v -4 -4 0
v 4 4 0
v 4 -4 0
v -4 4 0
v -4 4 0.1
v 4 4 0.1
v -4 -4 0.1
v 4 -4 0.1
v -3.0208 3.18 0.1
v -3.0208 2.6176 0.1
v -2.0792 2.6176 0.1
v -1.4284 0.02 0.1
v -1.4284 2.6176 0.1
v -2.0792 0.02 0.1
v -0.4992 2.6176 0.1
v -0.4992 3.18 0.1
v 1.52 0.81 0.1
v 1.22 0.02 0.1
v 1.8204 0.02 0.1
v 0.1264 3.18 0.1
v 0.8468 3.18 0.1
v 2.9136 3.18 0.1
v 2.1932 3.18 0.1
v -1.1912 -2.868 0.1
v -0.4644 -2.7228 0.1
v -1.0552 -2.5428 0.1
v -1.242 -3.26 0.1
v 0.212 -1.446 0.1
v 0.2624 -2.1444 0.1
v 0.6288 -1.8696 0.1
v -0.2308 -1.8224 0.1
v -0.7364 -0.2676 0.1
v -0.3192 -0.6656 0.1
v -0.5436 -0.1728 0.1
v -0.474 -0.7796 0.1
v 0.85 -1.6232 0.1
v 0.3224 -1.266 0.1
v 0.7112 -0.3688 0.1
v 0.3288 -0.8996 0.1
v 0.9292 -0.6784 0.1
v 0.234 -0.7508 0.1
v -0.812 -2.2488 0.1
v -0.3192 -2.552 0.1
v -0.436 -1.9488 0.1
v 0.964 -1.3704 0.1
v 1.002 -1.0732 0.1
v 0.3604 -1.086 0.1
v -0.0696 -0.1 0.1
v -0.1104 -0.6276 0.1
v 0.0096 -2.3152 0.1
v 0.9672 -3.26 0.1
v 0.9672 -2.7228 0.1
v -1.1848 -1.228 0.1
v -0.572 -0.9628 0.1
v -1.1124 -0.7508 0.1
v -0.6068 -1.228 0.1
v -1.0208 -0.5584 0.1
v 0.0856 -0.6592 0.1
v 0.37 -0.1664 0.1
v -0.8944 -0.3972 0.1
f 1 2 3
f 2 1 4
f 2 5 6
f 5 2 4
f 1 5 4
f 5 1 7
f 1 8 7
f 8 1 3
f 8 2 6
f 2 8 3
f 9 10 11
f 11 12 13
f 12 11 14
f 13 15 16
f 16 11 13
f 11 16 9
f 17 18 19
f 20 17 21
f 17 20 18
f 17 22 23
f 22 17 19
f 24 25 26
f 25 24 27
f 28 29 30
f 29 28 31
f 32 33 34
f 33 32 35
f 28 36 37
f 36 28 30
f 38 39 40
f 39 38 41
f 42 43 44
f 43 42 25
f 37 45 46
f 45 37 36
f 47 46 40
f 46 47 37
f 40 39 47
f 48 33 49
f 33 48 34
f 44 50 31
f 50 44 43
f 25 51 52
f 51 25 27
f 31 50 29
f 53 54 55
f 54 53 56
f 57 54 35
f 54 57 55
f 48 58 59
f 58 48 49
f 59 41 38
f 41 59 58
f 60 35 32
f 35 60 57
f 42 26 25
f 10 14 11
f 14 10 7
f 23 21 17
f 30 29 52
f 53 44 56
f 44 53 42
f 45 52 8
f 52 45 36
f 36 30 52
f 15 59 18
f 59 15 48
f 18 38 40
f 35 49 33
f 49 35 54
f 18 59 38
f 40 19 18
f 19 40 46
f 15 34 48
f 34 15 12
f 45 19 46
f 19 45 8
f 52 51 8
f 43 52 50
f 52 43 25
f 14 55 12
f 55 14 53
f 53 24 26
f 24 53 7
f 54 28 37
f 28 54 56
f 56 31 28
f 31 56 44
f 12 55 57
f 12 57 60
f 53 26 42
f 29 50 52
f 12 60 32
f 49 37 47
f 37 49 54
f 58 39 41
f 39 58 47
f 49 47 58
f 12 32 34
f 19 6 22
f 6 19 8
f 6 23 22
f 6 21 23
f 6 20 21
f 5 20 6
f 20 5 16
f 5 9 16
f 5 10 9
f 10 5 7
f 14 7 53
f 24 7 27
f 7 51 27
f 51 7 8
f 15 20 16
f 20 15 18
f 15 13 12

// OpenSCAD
// file: ../p/4-4edge.scad
use <../lib.scad>
$fa=1; $fs=0.2;
function ldraw_lib__4_4edge(realsolid=false) = [
// 0 Circle 1.0
// 0 Name: 4-4edge.dat
// 0 Author: James Jessiman
// 0 !LDRAW_ORG Primitive UPDATE 2017-01
// 0 !LICENSE Licensed under CC BY 2.0 and CC BY 4.0 : see CAreadme.txt
// 
// 0 BFC CERTIFY CCW
  [0,"BFC","CERTIFY"],
  [0,"BFC","CCW"],
// 
// 0 !HISTORY 1998-12-15 [PTadmin] Official Update 1998-10
// 0 !HISTORY 2005-12-28 [PTadmin] Official Update 2005-01
// 0 !HISTORY 2007-06-24 [PTadmin] Header formatted for Contributor Agreement
// 0 !HISTORY 2008-07-01 [PTadmin] Official Update 2008-01
// 0 !HISTORY 2017-01-15 [Steffen] BFCed
// 0 !HISTORY 2017-12-30 [PTadmin] Official Update 2017-01
// 
// 
// 2 24 1 0 0 0.9239 0 0.3827
  [2,24,1,0,0,0.9239,0,0.3827],
// 2 24 0.9239 0 0.3827 0.7071 0 0.7071
  [2,24,0.9239,0,0.3827,0.7071,0,0.7071],
// 2 24 0.7071 0 0.7071 0.3827 0 0.9239
  [2,24,0.7071,0,0.7071,0.3827,0,0.9239],
// 2 24 0.3827 0 0.9239 0 0 1
  [2,24,0.3827,0,0.9239,0,0,1],
// 2 24 0 0 1 -0.3827 0 0.9239
  [2,24,0,0,1,-0.3827,0,0.9239],
// 2 24 -0.3827 0 0.9239 -0.7071 0 0.7071
  [2,24,-0.3827,0,0.9239,-0.7071,0,0.7071],
// 2 24 -0.7071 0 0.7071 -0.9239 0 0.3827
  [2,24,-0.7071,0,0.7071,-0.9239,0,0.3827],
// 2 24 -0.9239 0 0.3827 -1 0 -0
  [2,24,-0.9239,0,0.3827,-1,0,-0],
// 2 24 -1 0 -0 -0.9239 0 -0.3827
  [2,24,-1,0,-0,-0.9239,0,-0.3827],
// 2 24 -0.9239 0 -0.3827 -0.7071 0 -0.7071
  [2,24,-0.9239,0,-0.3827,-0.7071,0,-0.7071],
// 2 24 -0.7071 0 -0.7071 -0.3827 0 -0.9239
  [2,24,-0.7071,0,-0.7071,-0.3827,0,-0.9239],
// 2 24 -0.3827 0 -0.9239 0 0 -1
  [2,24,-0.3827,0,-0.9239,0,0,-1],
// 2 24 0 0 -1 0.3827 0 -0.9239
  [2,24,0,0,-1,0.3827,0,-0.9239],
// 2 24 0.3827 0 -0.9239 0.7071 0 -0.7071
  [2,24,0.3827,0,-0.9239,0.7071,0,-0.7071],
// 2 24 0.7071 0 -0.7071 0.9239 0 -0.3827
  [2,24,0.7071,0,-0.7071,0.9239,0,-0.3827],
// 2 24 0.9239 0 -0.3827 1 0 0
  [2,24,0.9239,0,-0.3827,1,0,0],
];
module ldraw_lib__4_4edge(step=0, col=false, unit=2/5, alt=false, line=0.2, solid=!$preview)
    makepoly(ldraw_lib__4_4edge(solid), step=step, col=col, unit=unit, alt=alt, line=line, solid=solid);
ldraw_lib__4_4edge(line=0.2);
// file: ../p/4-4disc.scad
use <../lib.scad>
$fa=1; $fs=0.2;
function ldraw_lib__4_4disc(realsolid=false) = [
// 0 Disc 1.0
// 0 Name: 4-4disc.dat
// 0 Author: James Jessiman
// 0 !LDRAW_ORG Primitive UPDATE 2002-02
// 0 !LICENSE Licensed under CC BY 2.0 and CC BY 4.0 : see CAreadme.txt
// 
// 0 BFC CERTIFY CCW
  [0,"BFC","CERTIFY"],
  [0,"BFC","CCW"],
// 
// 0 !HISTORY 1998-12-15 [PTadmin] Official Update 1998-10
// 0 !HISTORY 2002-03-23 [sbliss] Added BFC statement
// 0 !HISTORY 2002-04-25 [PTadmin] Official Update 2002-02
// 0 !HISTORY 2007-06-24 [PTadmin] Header formatted for Contributor Agreement
// 0 !HISTORY 2008-07-01 [PTadmin] Official Update 2008-01
// 
// 
// 3 16 0 0 0 1 0 0 0.9239 0 0.3827
  [3,16,0,0,0,1,0,0,0.9239,0,0.3827],
// 3 16 0 0 0 0.9239 0 0.3827 0.7071 0 0.7071
  [3,16,0,0,0,0.9239,0,0.3827,0.7071,0,0.7071],
// 3 16 0 0 0 0.7071 0 0.7071 0.3827 0 0.9239
  [3,16,0,0,0,0.7071,0,0.7071,0.3827,0,0.9239],
// 3 16 0 0 0 0.3827 0 0.9239 0 0 1
  [3,16,0,0,0,0.3827,0,0.9239,0,0,1],
// 3 16 0 0 0 0 0 1 -0.3827 0 0.9239
  [3,16,0,0,0,0,0,1,-0.3827,0,0.9239],
// 3 16 0 0 0 -0.3827 0 0.9239 -0.7071 0 0.7071
  [3,16,0,0,0,-0.3827,0,0.9239,-0.7071,0,0.7071],
// 3 16 0 0 0 -0.7071 0 0.7071 -0.9239 0 0.3827
  [3,16,0,0,0,-0.7071,0,0.7071,-0.9239,0,0.3827],
// 3 16 0 0 0 -0.9239 0 0.3827 -1 0 -0
  [3,16,0,0,0,-0.9239,0,0.3827,-1,0,-0],
// 3 16 0 0 0 -1 0 -0 -0.9239 0 -0.3827
  [3,16,0,0,0,-1,0,-0,-0.9239,0,-0.3827],
// 3 16 0 0 0 -0.9239 0 -0.3827 -0.7071 0 -0.7071
  [3,16,0,0,0,-0.9239,0,-0.3827,-0.7071,0,-0.7071],
// 3 16 0 0 0 -0.7071 0 -0.7071 -0.3827 0 -0.9239
  [3,16,0,0,0,-0.7071,0,-0.7071,-0.3827,0,-0.9239],
// 3 16 0 0 0 -0.3827 0 -0.9239 0 0 -1
  [3,16,0,0,0,-0.3827,0,-0.9239,0,0,-1],
// 3 16 0 0 0 0 0 -1 0.3827 0 -0.9239
  [3,16,0,0,0,0,0,-1,0.3827,0,-0.9239],
// 3 16 0 0 0 0.3827 0 -0.9239 0.7071 0 -0.7071
  [3,16,0,0,0,0.3827,0,-0.9239,0.7071,0,-0.7071],
// 3 16 0 0 0 0.7071 0 -0.7071 0.9239 0 -0.3827
  [3,16,0,0,0,0.7071,0,-0.7071,0.9239,0,-0.3827],
// 3 16 0 0 0 0.9239 0 -0.3827 1 0 0
  [3,16,0,0,0,0.9239,0,-0.3827,1,0,0],
// 0
];
module ldraw_lib__4_4disc(step=0, col=false, unit=2/5, alt=false, line=0.2, solid=!$preview)
    makepoly(ldraw_lib__4_4disc(solid), step=step, col=col, unit=unit, alt=alt, line=line, solid=solid);
ldraw_lib__4_4disc(line=0.2);
// file: ../p/4-4cyli.scad
use <../lib.scad>
$fa=1; $fs=0.2;
function ldraw_lib__4_4cyli(realsolid=false) = [
// 0 Cylinder 1.0
// 0 Name: 4-4cyli.dat
// 0 Author: James Jessiman
// 0 !LDRAW_ORG Primitive UPDATE 2005-01
// 0 !LICENSE Licensed under CC BY 2.0 and CC BY 4.0 : see CAreadme.txt
// 
// 0 BFC CERTIFY CCW
  [0,"BFC","CERTIFY"],
  [0,"BFC","CCW"],
// 
// 0 !HISTORY 1998-12-15 [PTadmin] Official Update 1998-10
// 0 !HISTORY 2002-03-23 [sbliss] Added BFC statement; merged headers from files in distributions LDraw 0.27 and Complete.
// 0 !HISTORY 2002-04-25 [PTadmin] Official Update 2002-02
// 0 !HISTORY 2004-12-14 [guyvivan] BFC CCW
// 0 !HISTORY 2005-12-28 [PTadmin] Official Update 2005-01
// 0 !HISTORY 2007-06-24 [PTadmin] Header formatted for Contributor Agreement
// 0 !HISTORY 2008-07-01 [PTadmin] Official Update 2008-01
// 
// 
// 4 16 1 1 0 0.9239 1 0.3827 0.9239 0 0.3827 1 0 0
  [4,16,1,1,0,0.9239,1,0.3827,0.9239,0,0.3827,1,0,0],
// 5 24 1 0 0 1 1 0 0.9239 0 0.3827 0.9239 0 -0.3827
  [5,24,1,0,0,1,1,0,0.9239,0,0.3827,0.9239,0,-0.3827],
// 4 16 0.9239 1 0.3827 0.7071 1 0.7071 0.7071 0 0.7071 0.9239 0 0.3827
  [4,16,0.9239,1,0.3827,0.7071,1,0.7071,0.7071,0,0.7071,0.9239,0,0.3827],
// 5 24 0.9239 0 0.3827 0.9239 1 0.3827 0.7071 0 0.7071 1 0 0
  [5,24,0.9239,0,0.3827,0.9239,1,0.3827,0.7071,0,0.7071,1,0,0],
// 4 16 0.7071 1 0.7071 0.3827 1 0.9239 0.3827 0 0.9239 0.7071 0 0.7071
  [4,16,0.7071,1,0.7071,0.3827,1,0.9239,0.3827,0,0.9239,0.7071,0,0.7071],
// 5 24 0.7071 0 0.7071 0.7071 1 0.7071 0.3827 0 0.9239 0.9239 0 0.3827
  [5,24,0.7071,0,0.7071,0.7071,1,0.7071,0.3827,0,0.9239,0.9239,0,0.3827],
// 4 16 0.3827 1 0.9239 0 1 1 0 0 1 0.3827 0 0.9239
  [4,16,0.3827,1,0.9239,0,1,1,0,0,1,0.3827,0,0.9239],
// 5 24 0.3827 0 0.9239 0.3827 1 0.9239 0 0 1 0.7071 0 0.7071
  [5,24,0.3827,0,0.9239,0.3827,1,0.9239,0,0,1,0.7071,0,0.7071],
// 4 16 0 1 1 -0.3827 1 0.9239 -0.3827 0 0.9239 0 0 1
  [4,16,0,1,1,-0.3827,1,0.9239,-0.3827,0,0.9239,0,0,1],
// 5 24 0 0 1 0 1 1 -0.3827 0 0.9239 0.3827 0 0.9239
  [5,24,0,0,1,0,1,1,-0.3827,0,0.9239,0.3827,0,0.9239],
// 4 16 -0.3827 1 0.9239 -0.7071 1 0.7071 -0.7071 0 0.7071 -0.3827 0 0.9239
  [4,16,-0.3827,1,0.9239,-0.7071,1,0.7071,-0.7071,0,0.7071,-0.3827,0,0.9239],
// 5 24 -0.3827 0 0.9239 -0.3827 1 0.9239 -0.7071 0 0.7071 0 0 1
  [5,24,-0.3827,0,0.9239,-0.3827,1,0.9239,-0.7071,0,0.7071,0,0,1],
// 4 16 -0.7071 1 0.7071 -0.9239 1 0.3827 -0.9239 0 0.3827 -0.7071 0 0.7071
  [4,16,-0.7071,1,0.7071,-0.9239,1,0.3827,-0.9239,0,0.3827,-0.7071,0,0.7071],
// 5 24 -0.7071 0 0.7071 -0.7071 1 0.7071 -0.9239 0 0.3827 -0.3827 0 0.9239
  [5,24,-0.7071,0,0.7071,-0.7071,1,0.7071,-0.9239,0,0.3827,-0.3827,0,0.9239],
// 4 16 -0.9239 1 0.3827 -1 1 0 -1 0 0 -0.9239 0 0.3827
  [4,16,-0.9239,1,0.3827,-1,1,0,-1,0,0,-0.9239,0,0.3827],
// 5 24 -0.9239 0 0.3827 -0.9239 1 0.3827 -1 0 0 -0.7071 0 0.7071
  [5,24,-0.9239,0,0.3827,-0.9239,1,0.3827,-1,0,0,-0.7071,0,0.7071],
// 4 16 -1 1 0 -0.9239 1 -0.3827 -0.9239 0 -0.3827 -1 0 0
  [4,16,-1,1,0,-0.9239,1,-0.3827,-0.9239,0,-0.3827,-1,0,0],
// 5 24 -1 0 0 -1 1 0 -0.9239 0 -0.3827 -0.9239 0 0.3827
  [5,24,-1,0,0,-1,1,0,-0.9239,0,-0.3827,-0.9239,0,0.3827],
// 4 16 -0.9239 1 -0.3827 -0.7071 1 -0.7071 -0.7071 0 -0.7071 -0.9239 0 -0.3827
  [4,16,-0.9239,1,-0.3827,-0.7071,1,-0.7071,-0.7071,0,-0.7071,-0.9239,0,-0.3827],
// 5 24 -0.9239 0 -0.3827 -0.9239 1 -0.3827 -0.7071 0 -0.7071 -1 0 0
  [5,24,-0.9239,0,-0.3827,-0.9239,1,-0.3827,-0.7071,0,-0.7071,-1,0,0],
// 4 16 -0.7071 1 -0.7071 -0.3827 1 -0.9239 -0.3827 0 -0.9239 -0.7071 0 -0.7071
  [4,16,-0.7071,1,-0.7071,-0.3827,1,-0.9239,-0.3827,0,-0.9239,-0.7071,0,-0.7071],
// 5 24 -0.7071 0 -0.7071 -0.7071 1 -0.7071 -0.3827 0 -0.9239 -0.9239 0 -0.3827
  [5,24,-0.7071,0,-0.7071,-0.7071,1,-0.7071,-0.3827,0,-0.9239,-0.9239,0,-0.3827],
// 4 16 -0.3827 1 -0.9239 0 1 -1 0 0 -1 -0.3827 0 -0.9239
  [4,16,-0.3827,1,-0.9239,0,1,-1,0,0,-1,-0.3827,0,-0.9239],
// 5 24 -0.3827 0 -0.9239 -0.3827 1 -0.9239 0 0 -1 -0.7071 0 -0.7071
  [5,24,-0.3827,0,-0.9239,-0.3827,1,-0.9239,0,0,-1,-0.7071,0,-0.7071],
// 4 16 0 1 -1 0.3827 1 -0.9239 0.3827 0 -0.9239 0 0 -1
  [4,16,0,1,-1,0.3827,1,-0.9239,0.3827,0,-0.9239,0,0,-1],
// 5 24 0 0 -1 0 1 -1 0.3827 0 -0.9239 -0.3827 0 -0.9239
  [5,24,0,0,-1,0,1,-1,0.3827,0,-0.9239,-0.3827,0,-0.9239],
// 4 16 0.3827 1 -0.9239 0.7071 1 -0.7071 0.7071 0 -0.7071 0.3827 0 -0.9239
  [4,16,0.3827,1,-0.9239,0.7071,1,-0.7071,0.7071,0,-0.7071,0.3827,0,-0.9239],
// 5 24 0.3827 0 -0.9239 0.3827 1 -0.9239 0.7071 0 -0.7071 0 0 -1
  [5,24,0.3827,0,-0.9239,0.3827,1,-0.9239,0.7071,0,-0.7071,0,0,-1],
// 4 16 0.7071 1 -0.7071 0.9239 1 -0.3827 0.9239 0 -0.3827 0.7071 0 -0.7071
  [4,16,0.7071,1,-0.7071,0.9239,1,-0.3827,0.9239,0,-0.3827,0.7071,0,-0.7071],
// 5 24 0.7071 0 -0.7071 0.7071 1 -0.7071 0.9239 0 -0.3827 0.3827 0 -0.9239
  [5,24,0.7071,0,-0.7071,0.7071,1,-0.7071,0.9239,0,-0.3827,0.3827,0,-0.9239],
// 4 16 0.9239 1 -0.3827 1 1 0 1 0 0 0.9239 0 -0.3827
  [4,16,0.9239,1,-0.3827,1,1,0,1,0,0,0.9239,0,-0.3827],
// 5 24 0.9239 0 -0.3827 0.9239 1 -0.3827 1 0 0 0.7071 0 -0.7071
  [5,24,0.9239,0,-0.3827,0.9239,1,-0.3827,1,0,0,0.7071,0,-0.7071],
// 0
];
module ldraw_lib__4_4cyli(step=0, col=false, unit=2/5, alt=false, line=0.2, solid=!$preview)
    makepoly(ldraw_lib__4_4cyli(solid), step=step, col=col, unit=unit, alt=alt, line=line, solid=solid);
ldraw_lib__4_4cyli(line=0.2);
// file: ../p/stud3.scad
use <../lib.scad>
use <4-4cyli.scad>
use <4-4disc.scad>
use <4-4edge.scad>
$fa=1; $fs=0.2;
function ldraw_lib__stud3(realsolid=false) = realsolid ? 
    [openscad(translate([0,0,-eps()], o=cylinder(4+eps(), r=4)),2)] : [
// 0 Stud Tube Solid
// 0 Name: stud3.dat
// 0 Author: James Jessiman
// 0 !LDRAW_ORG Primitive UPDATE 2012-01
// 0 !LICENSE Licensed under CC BY 2.0 and CC BY 4.0 : see CAreadme.txt
// 
// 0 BFC CERTIFY CCW
  [0,"BFC","CERTIFY"],
  [0,"BFC","CCW"],
// 
// 0 !HISTORY 2002-04-04 [sbliss] Modified for BFC compliance
// 0 !HISTORY 2002-04-25 [PTadmin] Official Update 2002-02
// 0 !HISTORY 2007-06-24 [PTadmin] Header formatted for Contributor Agreement
// 0 !HISTORY 2008-07-01 [PTadmin] Official Update 2008-01
// 0 !HISTORY 2012-02-16 [Philo] Changed to CCW
// 0 !HISTORY 2012-03-30 [PTadmin] Official Update 2012-01
// 
// 
// 1 16 0 -4 0 4 0 0 0 1 0 0 0 4 4-4edge.dat
  [1,16,0,-4,0,4,0,0,0,1,0,0,0,4, ldraw_lib__4_4edge(realsolid)],
// 1 16 0 0 0 4 0 0 0 1 0 0 0 4 4-4edge.dat
  [1,16,0,0,0,4,0,0,0,1,0,0,0,4, ldraw_lib__4_4edge(realsolid)],
// 1 16 0 -4 0 4 0 0 0 1 0 0 0 4 4-4disc.dat
  [1,16,0,-4,0,4,0,0,0,1,0,0,0,4, ldraw_lib__4_4disc(realsolid)],
// 1 16 0 -4 0 4 0 0 0 4 0 0 0 4 4-4cyli.dat
  [1,16,0,-4,0,4,0,0,0,4,0,0,0,4, ldraw_lib__4_4cyli(realsolid)],
];
module ldraw_lib__stud3(step=0, col=false, unit=2/5, alt=false, line=0.2, solid=!$preview)
    makepoly(ldraw_lib__stud3(solid), step=step, col=col, unit=unit, alt=alt, line=line, solid=solid);
ldraw_lib__stud3(line=0.2);
// file: ../p/stud.scad
use <../lib.scad>
use <4-4cyli.scad>
use <4-4disc.scad>
use <4-4edge.scad>
$fa=1; $fs=0.2;
function ldraw_lib__stud(realsolid=false) = realsolid ? 
    [openscad(translate([0,0,-eps()], o=cylinder(4+eps(), r=6)),2)] : [
// 0 Stud
// 0 Name: stud.dat
// 0 Author: James Jessiman
// 0 !LDRAW_ORG Primitive UPDATE 2012-01
// 0 !LICENSE Licensed under CC BY 2.0 and CC BY 4.0 : see CAreadme.txt
// 
// 0 BFC CERTIFY CCW
  [0,"BFC","CERTIFY"],
  [0,"BFC","CCW"],
// 
// 0 !HISTORY 2002-04-04 [sbliss] Modified for BFC compliance
// 0 !HISTORY 2002-04-25 [PTadmin] Official Update 2002-02
// 0 !HISTORY 2007-06-24 [PTadmin] Header formatted for Contributor Agreement
// 0 !HISTORY 2008-07-01 [PTadmin] Official Update 2008-01
// 0 !HISTORY 2012-02-16 [Philo] Changed to CCW
// 0 !HISTORY 2012-03-30 [PTadmin] Official Update 2012-01
// 
// 
// 1 16 0 0 0 6 0 0 0 1 0 0 0 6 4-4edge.dat
  [1,16,0,0,0,6,0,0,0,1,0,0,0,6, ldraw_lib__4_4edge(realsolid)],
// 1 16 0 -4 0 6 0 0 0 1 0 0 0 6 4-4edge.dat
  [1,16,0,-4,0,6,0,0,0,1,0,0,0,6, ldraw_lib__4_4edge(realsolid)],
// 1 16 0 0 0 6 0 0 0 -4 0 0 0 6 4-4cyli.dat
  [1,16,0,0,0,6,0,0,0,-4,0,0,0,6, ldraw_lib__4_4cyli(realsolid)],
// 1 16 0 -4 0 6 0 0 0 1 0 0 0 6 4-4disc.dat
  [1,16,0,-4,0,6,0,0,0,1,0,0,0,6, ldraw_lib__4_4disc(realsolid)],
];
module ldraw_lib__stud(step=0, col=false, unit=2/5, alt=false, line=0.2, solid=!$preview)
    makepoly(ldraw_lib__stud(solid), step=step, col=col, unit=unit, alt=alt, line=line, solid=solid);
ldraw_lib__stud(line=0.2);
// file: ../p/box5.scad
use <../lib.scad>
$fa=1; $fs=0.2;
function ldraw_lib__box5(realsolid=false) = [
// 0 Box with 5 Faces and All Edges
// 0 Name: box5.dat
// 0 Author: James Jessiman
// 0 !LDRAW_ORG Primitive UPDATE 2012-01
// 0 !LICENSE Licensed under CC BY 2.0 and CC BY 4.0 : see CAreadme.txt
// 
// 0 BFC CERTIFY CCW
  [0,"BFC","CERTIFY"],
  [0,"BFC","CCW"],
// 
// 0 !HISTORY 2002-04-03 [sbliss] Modified for BFC compliance
// 0 !HISTORY 2002-04-25 [PTadmin] Official Update 2002-02
// 0 !HISTORY 2007-06-24 [PTadmin] Header formatted for Contributor Agreement
// 0 !HISTORY 2008-07-01 [PTadmin] Official Update 2008-01
// 0 !HISTORY 2012-02-16 [Philo] Changed to CCW
// 0 !HISTORY 2012-03-30 [PTadmin] Official Update 2012-01
// 
// 
// 2 24 1 1 1 -1 1 1
  [2,24,1,1,1,-1,1,1],
// 2 24 -1 1 1 -1 1 -1
  [2,24,-1,1,1,-1,1,-1],
// 2 24 -1 1 -1 1 1 -1
  [2,24,-1,1,-1,1,1,-1],
// 2 24 1 1 -1 1 1 1
  [2,24,1,1,-1,1,1,1],
// 2 24 1 0 1 -1 0 1
  [2,24,1,0,1,-1,0,1],
// 2 24 -1 0 1 -1 0 -1
  [2,24,-1,0,1,-1,0,-1],
// 2 24 -1 0 -1 1 0 -1
  [2,24,-1,0,-1,1,0,-1],
// 2 24 1 0 -1 1 0 1
  [2,24,1,0,-1,1,0,1],
// 2 24 1 0 1 1 1 1
  [2,24,1,0,1,1,1,1],
// 2 24 -1 0 1 -1 1 1
  [2,24,-1,0,1,-1,1,1],
// 2 24 1 0 -1 1 1 -1
  [2,24,1,0,-1,1,1,-1],
// 2 24 -1 0 -1 -1 1 -1
  [2,24,-1,0,-1,-1,1,-1],
// 4 16 -1 1 1 1 1 1 1 1 -1 -1 1 -1
  [4,16,-1,1,1,1,1,1,1,1,-1,-1,1,-1],
// 4 16 -1 1 1 -1 0 1 1 0 1 1 1 1
  [4,16,-1,1,1,-1,0,1,1,0,1,1,1,1],
// 4 16 -1 1 -1 -1 0 -1 -1 0 1 -1 1 1
  [4,16,-1,1,-1,-1,0,-1,-1,0,1,-1,1,1],
// 4 16 1 1 -1 1 0 -1 -1 0 -1 -1 1 -1
  [4,16,1,1,-1,1,0,-1,-1,0,-1,-1,1,-1],
// 4 16 1 1 1 1 0 1 1 0 -1 1 1 -1
  [4,16,1,1,1,1,0,1,1,0,-1,1,1,-1],
];
module ldraw_lib__box5(step=0, col=false, unit=2/5, alt=false, line=0.2, solid=!$preview)
    makepoly(ldraw_lib__box5(solid), step=step, col=col, unit=unit, alt=alt, line=line, solid=solid);
ldraw_lib__box5(line=0.2);
// file: ../p/box4t.scad
use <../lib.scad>
$fa=1; $fs=0.2;
function ldraw_lib__box4t(realsolid=false) = [
// 0 Box with 4 Adjacent Faces and All Edges
// 0 Name: box4t.dat
// 0 Author: Tore Eriksson [Tore_Eriksson]
// 0 !LDRAW_ORG Primitive UPDATE 2003-02
// 0 !LICENSE Licensed under CC BY 2.0 and CC BY 4.0 : see CAreadme.txt
// 
// 0 BFC CERTIFY CCW
  [0,"BFC","CERTIFY"],
  [0,"BFC","CCW"],
// 
// 0 !HISTORY 1997-09-29 [PTadmin] Official Update 1997-15
// 0 !HISTORY 2002-08-31 [izanette] Modified with WINDZ for BFC compliance
// 0 !HISTORY 2003-08-01 [PTadmin] Official Update 2003-02
// 0 !HISTORY 2007-06-24 [PTadmin] Header formatted for Contributor Agreement
// 0 !HISTORY 2008-07-01 [PTadmin] Official Update 2008-01
// 
// 
// 2 24 1 1 1 -1 1 1
  [2,24,1,1,1,-1,1,1],
// 2 24 -1 1 1 -1 1 -1
  [2,24,-1,1,1,-1,1,-1],
// 2 24 -1 1 -1 1 1 -1
  [2,24,-1,1,-1,1,1,-1],
// 2 24 1 1 -1 1 1 1
  [2,24,1,1,-1,1,1,1],
// 2 24 1 0 1 -1 0 1
  [2,24,1,0,1,-1,0,1],
// 2 24 -1 0 1 -1 0 -1
  [2,24,-1,0,1,-1,0,-1],
// 2 24 -1 0 -1 1 0 -1
  [2,24,-1,0,-1,1,0,-1],
// 2 24 1 0 -1 1 0 1
  [2,24,1,0,-1,1,0,1],
// 2 24 1 0 1 1 1 1
  [2,24,1,0,1,1,1,1],
// 2 24 -1 0 1 -1 1 1
  [2,24,-1,0,1,-1,1,1],
// 2 24 1 0 -1 1 1 -1
  [2,24,1,0,-1,1,1,-1],
// 2 24 -1 0 -1 -1 1 -1
  [2,24,-1,0,-1,-1,1,-1],
// 4 16 1 1 1 1 1 -1 -1 1 -1 -1 1 1
  [4,16,1,1,1,1,1,-1,-1,1,-1,-1,1,1],
// 4 16 1 1 1 -1 1 1 -1 0 1 1 0 1
  [4,16,1,1,1,-1,1,1,-1,0,1,1,0,1],
// 4 16 -1 1 1 -1 1 -1 -1 0 -1 -1 0 1
  [4,16,-1,1,1,-1,1,-1,-1,0,-1,-1,0,1],
// 0 4 16 -1 1 -1 -1 0 -1 1 0 -1 1 1 -1
// 4 16 1 1 -1 1 1 1 1 0 1 1 0 -1
  [4,16,1,1,-1,1,1,1,1,0,1,1,0,-1],
// 0
];
module ldraw_lib__box4t(step=0, col=false, unit=2/5, alt=false, line=0.2, solid=!$preview)
    makepoly(ldraw_lib__box4t(solid), step=step, col=col, unit=unit, alt=alt, line=line, solid=solid);
ldraw_lib__box4t(line=0.2);
// file: s/3004s01.scad
use <../../lib.scad>
use <../../p/box4t.scad>
use <../../p/box5.scad>
use <../../p/stud.scad>
use <../../p/stud3.scad>
$fa=1; $fs=0.2;
function ldraw_lib__s__3004s01(realsolid=false) = [
// 0 ~Brick  1 x  2 without Front Face
// 0 Name: s\3004s01.dat
// 0 Author: James Jessiman
// 0 !LDRAW_ORG Subpart UPDATE 2003-03
// 0 !LICENSE Licensed under CC BY 2.0 and CC BY 4.0 : see CAreadme.txt
// 
// 0 BFC CERTIFY CCW
  [0,"BFC","CERTIFY"],
  [0,"BFC","CCW"],
// 
// 0 !HISTORY 2003-09-07 [jriley] Subfiling, BFC
// 0 !HISTORY 2003-12-19 [PTadmin] Official Update 2003-03
// 0 !HISTORY 2007-08-29 [PTadmin] Header formatted for Contributor Agreement
// 0 !HISTORY 2008-07-01 [PTadmin] Official Update 2008-01
// 
// 
// 1 16 0 4 0 1 0 0 0 -5 0 0 0 1 stud3.dat
  [1,16,0,4,0,1,0,0,0,-5,0,0,0,1, ldraw_lib__stud3(realsolid)],
// 0 BFC INVERTNEXT
  [0,"BFC","INVERTNEXT"],
// 1 16 0 24 0 16 0 0 0 -20 0 0 0 6 box5.dat
  [1,16,0,24,0,16,0,0,0,-20,0,0,0,6, ldraw_lib__box5(realsolid)],
// 4 16 20 24 10 16 24 6 -16 24 6 -20 24 10
  [4,16,20,24,10,16,24,6,-16,24,6,-20,24,10],
// 4 16 -20 24 10 -16 24 6 -16 24 -6 -20 24 -10
  [4,16,-20,24,10,-16,24,6,-16,24,-6,-20,24,-10],
// 4 16 -20 24 -10 -16 24 -6 16 24 -6 20 24 -10
  [4,16,-20,24,-10,-16,24,-6,16,24,-6,20,24,-10],
// 4 16 20 24 -10 16 24 -6 16 24 6 20 24 10
  [4,16,20,24,-10,16,24,-6,16,24,6,20,24,10],
// 1 16 0 24 0 20 0 0 0 -24 0 0 0 10 box4t.dat
  [1,16,0,24,0,20,0,0,0,-24,0,0,0,10, ldraw_lib__box4t(realsolid)],
// 1 16 10 0 0 1 0 0 0 1 0 0 0 1 stud.dat
  [1,16,10,0,0,1,0,0,0,1,0,0,0,1, ldraw_lib__stud(realsolid)],
// 1 16 -10 0 0 1 0 0 0 1 0 0 0 1 stud.dat
  [1,16,-10,0,0,1,0,0,0,1,0,0,0,1, ldraw_lib__stud(realsolid)],
// 0
];
module ldraw_lib__s__3004s01(step=0, col=false, unit=2/5, alt=false, line=0.2, solid=!$preview)
    makepoly(ldraw_lib__s__3004s01(solid), step=step, col=col, unit=unit, alt=alt, line=line, solid=solid);
ldraw_lib__s__3004s01(line=0.2);
// file: 3004.scad
use <../lib.scad>
use <s/3004s01.scad>
$fa=1; $fs=0.2;
function ldraw_lib__3004(realsolid=false) = [
// 0 Brick  1 x  2
// 0 Name: 3004.dat
// 0 Author: James Jessiman
// 0 !LDRAW_ORG Part UPDATE 2022-05
// 0 !LICENSE Licensed under CC BY 2.0 and CC BY 4.0 : see CAreadme.txt
// 
// 0 BFC CERTIFY CCW
  [0,"BFC","CERTIFY"],
  [0,"BFC","CCW"],
// 
// 0 !HISTORY 2001-10-26 [PTadmin] Official Update 2001-01
// 0 !HISTORY 2002-05-07 {unknown} BFC Certification
// 0 !HISTORY 2002-06-11 [PTadmin] Official Update 2002-03
// 0 !HISTORY 2007-05-07 [PTadmin] Header formatted for Contributor Agreement
// 0 !HISTORY 2008-07-01 [PTadmin] Official Update 2008-01
// 0 !HISTORY 2022-08-04 [MagFors] Using subfile
// 0 !HISTORY 2022-09-15 [PTadmin] Official Update 2022-05
// 
// 
// 1 16 0 0 0 1 0 0 0 1 0 0 0 1 s\3004s01.dat
  [1,16,0,0,0,1,0,0,0,1,0,0,0,1, ldraw_lib__s__3004s01(realsolid)],
// 4 16 -20 24 -10 20 24 -10 20 0 -10 -20 0 -10
  [4,16,-20,24,-10,20,24,-10,20,0,-10,-20,0,-10],
];
module ldraw_lib__3004(step=0, col=false, unit=2/5, alt=false, line=0.2, solid=!$preview)
    makepoly(ldraw_lib__3004(solid), step=step, col=col, unit=unit, alt=alt, line=line, solid=solid);
ldraw_lib__3004(line=0.2);
// file: ../p/box5-12.scad
use <../lib.scad>
$fa=1; $fs=0.2;
function ldraw_lib__box5_12(realsolid=false) = [
// 0 Box with 5 Faces without Any Edges
// 0 Name: box5-12.dat
// 0 Author: Chris Dee [cwdee]
// 0 !LDRAW_ORG Primitive UPDATE 2009-02
// 0 !LICENSE Licensed under CC BY 2.0 and CC BY 4.0 : see CAreadme.txt
// 
// 0 BFC CERTIFY CCW
  [0,"BFC","CERTIFY"],
  [0,"BFC","CCW"],
// 
// 0 !HISTORY 2009-09-03 [PTadmin] Official Update 2009-02
// 
// 
// 4 16 1 1 1 1 1 -1 -1 1 -1 -1 1 1
  [4,16,1,1,1,1,1,-1,-1,1,-1,-1,1,1],
// 4 16 -1 0 1 1 0 1 1 1 1 -1 1 1
  [4,16,-1,0,1,1,0,1,1,1,1,-1,1,1],
// 4 16 -1 0 -1 -1 0 1 -1 1 1 -1 1 -1
  [4,16,-1,0,-1,-1,0,1,-1,1,1,-1,1,-1],
// 4 16 1 0 -1 -1 0 -1 -1 1 -1 1 1 -1
  [4,16,1,0,-1,-1,0,-1,-1,1,-1,1,1,-1],
// 4 16 1 0 1 1 0 -1 1 1 -1 1 1 1
  [4,16,1,0,1,1,0,-1,1,1,-1,1,1,1],
// 0
];
module ldraw_lib__box5_12(step=0, col=false, unit=2/5, alt=false, line=0.2, solid=!$preview)
    makepoly(ldraw_lib__box5_12(solid), step=step, col=col, unit=unit, alt=alt, line=line, solid=solid);
ldraw_lib__box5_12(line=0.2);
// main file
use <../lib.scad>
use <../p/box5-12.scad>
use <s/003672bs01.scad>
$fa=1; $fs=0.2;
function ldraw_lib__003672b(realsolid=false) = [
// 0 Sticker  1 x  1 with White "TV2" on Blue Background
// 0 Name: 003672b.dat
// 0 Author: Willy Tschager [Holly-Wood]
// 0 !LDRAW_ORG Part UPDATE 2022-04
// 0 !LICENSE Licensed under CC BY 2.0 and CC BY 4.0 : see CAreadme.txt
// 
// 0 BFC CERTIFY CCW
  [0,"BFC","CERTIFY"],
  [0,"BFC","CCW"],
// 
// 0 !KEYWORDS Bricklink 664stk01, Brickowl 560716, camera, legoland
// 0 !KEYWORDS Rebrickable 3672, set 664, television, van
// 
// 0 !HISTORY 2022-07-18 [PTadmin] Official Update 2022-04
// 
// 
// 0 // Small Box
// 
// 1 16 0 -0.25 0 10 0 0 0 0.25 0 0 0 10 box5-12.dat
  [1,16,0,-0.25,0,10,0,0,0,0.25,0,0,0,10, ldraw_lib__box5_12(realsolid)],
// 
// 0 // www.holly-wood.it
// 
// 0 // Pattern Subpart
// 1 16 0 0 0 1 0 0 0 1 0 0 0 1 s\003672bs01.dat
  [1,16,0,0,0,1,0,0,0,1,0,0,0,1, ldraw_lib__s__003672bs01(realsolid)],
];
module ldraw_lib__003672b(step=0, col=false, unit=2/5, alt=false, line=0.2, solid=!$preview)
    makepoly(ldraw_lib__003672b(solid), step=step, col=col, unit=unit, alt=alt, line=line, solid=solid);
ldraw_lib__003672b(line=0.2);
